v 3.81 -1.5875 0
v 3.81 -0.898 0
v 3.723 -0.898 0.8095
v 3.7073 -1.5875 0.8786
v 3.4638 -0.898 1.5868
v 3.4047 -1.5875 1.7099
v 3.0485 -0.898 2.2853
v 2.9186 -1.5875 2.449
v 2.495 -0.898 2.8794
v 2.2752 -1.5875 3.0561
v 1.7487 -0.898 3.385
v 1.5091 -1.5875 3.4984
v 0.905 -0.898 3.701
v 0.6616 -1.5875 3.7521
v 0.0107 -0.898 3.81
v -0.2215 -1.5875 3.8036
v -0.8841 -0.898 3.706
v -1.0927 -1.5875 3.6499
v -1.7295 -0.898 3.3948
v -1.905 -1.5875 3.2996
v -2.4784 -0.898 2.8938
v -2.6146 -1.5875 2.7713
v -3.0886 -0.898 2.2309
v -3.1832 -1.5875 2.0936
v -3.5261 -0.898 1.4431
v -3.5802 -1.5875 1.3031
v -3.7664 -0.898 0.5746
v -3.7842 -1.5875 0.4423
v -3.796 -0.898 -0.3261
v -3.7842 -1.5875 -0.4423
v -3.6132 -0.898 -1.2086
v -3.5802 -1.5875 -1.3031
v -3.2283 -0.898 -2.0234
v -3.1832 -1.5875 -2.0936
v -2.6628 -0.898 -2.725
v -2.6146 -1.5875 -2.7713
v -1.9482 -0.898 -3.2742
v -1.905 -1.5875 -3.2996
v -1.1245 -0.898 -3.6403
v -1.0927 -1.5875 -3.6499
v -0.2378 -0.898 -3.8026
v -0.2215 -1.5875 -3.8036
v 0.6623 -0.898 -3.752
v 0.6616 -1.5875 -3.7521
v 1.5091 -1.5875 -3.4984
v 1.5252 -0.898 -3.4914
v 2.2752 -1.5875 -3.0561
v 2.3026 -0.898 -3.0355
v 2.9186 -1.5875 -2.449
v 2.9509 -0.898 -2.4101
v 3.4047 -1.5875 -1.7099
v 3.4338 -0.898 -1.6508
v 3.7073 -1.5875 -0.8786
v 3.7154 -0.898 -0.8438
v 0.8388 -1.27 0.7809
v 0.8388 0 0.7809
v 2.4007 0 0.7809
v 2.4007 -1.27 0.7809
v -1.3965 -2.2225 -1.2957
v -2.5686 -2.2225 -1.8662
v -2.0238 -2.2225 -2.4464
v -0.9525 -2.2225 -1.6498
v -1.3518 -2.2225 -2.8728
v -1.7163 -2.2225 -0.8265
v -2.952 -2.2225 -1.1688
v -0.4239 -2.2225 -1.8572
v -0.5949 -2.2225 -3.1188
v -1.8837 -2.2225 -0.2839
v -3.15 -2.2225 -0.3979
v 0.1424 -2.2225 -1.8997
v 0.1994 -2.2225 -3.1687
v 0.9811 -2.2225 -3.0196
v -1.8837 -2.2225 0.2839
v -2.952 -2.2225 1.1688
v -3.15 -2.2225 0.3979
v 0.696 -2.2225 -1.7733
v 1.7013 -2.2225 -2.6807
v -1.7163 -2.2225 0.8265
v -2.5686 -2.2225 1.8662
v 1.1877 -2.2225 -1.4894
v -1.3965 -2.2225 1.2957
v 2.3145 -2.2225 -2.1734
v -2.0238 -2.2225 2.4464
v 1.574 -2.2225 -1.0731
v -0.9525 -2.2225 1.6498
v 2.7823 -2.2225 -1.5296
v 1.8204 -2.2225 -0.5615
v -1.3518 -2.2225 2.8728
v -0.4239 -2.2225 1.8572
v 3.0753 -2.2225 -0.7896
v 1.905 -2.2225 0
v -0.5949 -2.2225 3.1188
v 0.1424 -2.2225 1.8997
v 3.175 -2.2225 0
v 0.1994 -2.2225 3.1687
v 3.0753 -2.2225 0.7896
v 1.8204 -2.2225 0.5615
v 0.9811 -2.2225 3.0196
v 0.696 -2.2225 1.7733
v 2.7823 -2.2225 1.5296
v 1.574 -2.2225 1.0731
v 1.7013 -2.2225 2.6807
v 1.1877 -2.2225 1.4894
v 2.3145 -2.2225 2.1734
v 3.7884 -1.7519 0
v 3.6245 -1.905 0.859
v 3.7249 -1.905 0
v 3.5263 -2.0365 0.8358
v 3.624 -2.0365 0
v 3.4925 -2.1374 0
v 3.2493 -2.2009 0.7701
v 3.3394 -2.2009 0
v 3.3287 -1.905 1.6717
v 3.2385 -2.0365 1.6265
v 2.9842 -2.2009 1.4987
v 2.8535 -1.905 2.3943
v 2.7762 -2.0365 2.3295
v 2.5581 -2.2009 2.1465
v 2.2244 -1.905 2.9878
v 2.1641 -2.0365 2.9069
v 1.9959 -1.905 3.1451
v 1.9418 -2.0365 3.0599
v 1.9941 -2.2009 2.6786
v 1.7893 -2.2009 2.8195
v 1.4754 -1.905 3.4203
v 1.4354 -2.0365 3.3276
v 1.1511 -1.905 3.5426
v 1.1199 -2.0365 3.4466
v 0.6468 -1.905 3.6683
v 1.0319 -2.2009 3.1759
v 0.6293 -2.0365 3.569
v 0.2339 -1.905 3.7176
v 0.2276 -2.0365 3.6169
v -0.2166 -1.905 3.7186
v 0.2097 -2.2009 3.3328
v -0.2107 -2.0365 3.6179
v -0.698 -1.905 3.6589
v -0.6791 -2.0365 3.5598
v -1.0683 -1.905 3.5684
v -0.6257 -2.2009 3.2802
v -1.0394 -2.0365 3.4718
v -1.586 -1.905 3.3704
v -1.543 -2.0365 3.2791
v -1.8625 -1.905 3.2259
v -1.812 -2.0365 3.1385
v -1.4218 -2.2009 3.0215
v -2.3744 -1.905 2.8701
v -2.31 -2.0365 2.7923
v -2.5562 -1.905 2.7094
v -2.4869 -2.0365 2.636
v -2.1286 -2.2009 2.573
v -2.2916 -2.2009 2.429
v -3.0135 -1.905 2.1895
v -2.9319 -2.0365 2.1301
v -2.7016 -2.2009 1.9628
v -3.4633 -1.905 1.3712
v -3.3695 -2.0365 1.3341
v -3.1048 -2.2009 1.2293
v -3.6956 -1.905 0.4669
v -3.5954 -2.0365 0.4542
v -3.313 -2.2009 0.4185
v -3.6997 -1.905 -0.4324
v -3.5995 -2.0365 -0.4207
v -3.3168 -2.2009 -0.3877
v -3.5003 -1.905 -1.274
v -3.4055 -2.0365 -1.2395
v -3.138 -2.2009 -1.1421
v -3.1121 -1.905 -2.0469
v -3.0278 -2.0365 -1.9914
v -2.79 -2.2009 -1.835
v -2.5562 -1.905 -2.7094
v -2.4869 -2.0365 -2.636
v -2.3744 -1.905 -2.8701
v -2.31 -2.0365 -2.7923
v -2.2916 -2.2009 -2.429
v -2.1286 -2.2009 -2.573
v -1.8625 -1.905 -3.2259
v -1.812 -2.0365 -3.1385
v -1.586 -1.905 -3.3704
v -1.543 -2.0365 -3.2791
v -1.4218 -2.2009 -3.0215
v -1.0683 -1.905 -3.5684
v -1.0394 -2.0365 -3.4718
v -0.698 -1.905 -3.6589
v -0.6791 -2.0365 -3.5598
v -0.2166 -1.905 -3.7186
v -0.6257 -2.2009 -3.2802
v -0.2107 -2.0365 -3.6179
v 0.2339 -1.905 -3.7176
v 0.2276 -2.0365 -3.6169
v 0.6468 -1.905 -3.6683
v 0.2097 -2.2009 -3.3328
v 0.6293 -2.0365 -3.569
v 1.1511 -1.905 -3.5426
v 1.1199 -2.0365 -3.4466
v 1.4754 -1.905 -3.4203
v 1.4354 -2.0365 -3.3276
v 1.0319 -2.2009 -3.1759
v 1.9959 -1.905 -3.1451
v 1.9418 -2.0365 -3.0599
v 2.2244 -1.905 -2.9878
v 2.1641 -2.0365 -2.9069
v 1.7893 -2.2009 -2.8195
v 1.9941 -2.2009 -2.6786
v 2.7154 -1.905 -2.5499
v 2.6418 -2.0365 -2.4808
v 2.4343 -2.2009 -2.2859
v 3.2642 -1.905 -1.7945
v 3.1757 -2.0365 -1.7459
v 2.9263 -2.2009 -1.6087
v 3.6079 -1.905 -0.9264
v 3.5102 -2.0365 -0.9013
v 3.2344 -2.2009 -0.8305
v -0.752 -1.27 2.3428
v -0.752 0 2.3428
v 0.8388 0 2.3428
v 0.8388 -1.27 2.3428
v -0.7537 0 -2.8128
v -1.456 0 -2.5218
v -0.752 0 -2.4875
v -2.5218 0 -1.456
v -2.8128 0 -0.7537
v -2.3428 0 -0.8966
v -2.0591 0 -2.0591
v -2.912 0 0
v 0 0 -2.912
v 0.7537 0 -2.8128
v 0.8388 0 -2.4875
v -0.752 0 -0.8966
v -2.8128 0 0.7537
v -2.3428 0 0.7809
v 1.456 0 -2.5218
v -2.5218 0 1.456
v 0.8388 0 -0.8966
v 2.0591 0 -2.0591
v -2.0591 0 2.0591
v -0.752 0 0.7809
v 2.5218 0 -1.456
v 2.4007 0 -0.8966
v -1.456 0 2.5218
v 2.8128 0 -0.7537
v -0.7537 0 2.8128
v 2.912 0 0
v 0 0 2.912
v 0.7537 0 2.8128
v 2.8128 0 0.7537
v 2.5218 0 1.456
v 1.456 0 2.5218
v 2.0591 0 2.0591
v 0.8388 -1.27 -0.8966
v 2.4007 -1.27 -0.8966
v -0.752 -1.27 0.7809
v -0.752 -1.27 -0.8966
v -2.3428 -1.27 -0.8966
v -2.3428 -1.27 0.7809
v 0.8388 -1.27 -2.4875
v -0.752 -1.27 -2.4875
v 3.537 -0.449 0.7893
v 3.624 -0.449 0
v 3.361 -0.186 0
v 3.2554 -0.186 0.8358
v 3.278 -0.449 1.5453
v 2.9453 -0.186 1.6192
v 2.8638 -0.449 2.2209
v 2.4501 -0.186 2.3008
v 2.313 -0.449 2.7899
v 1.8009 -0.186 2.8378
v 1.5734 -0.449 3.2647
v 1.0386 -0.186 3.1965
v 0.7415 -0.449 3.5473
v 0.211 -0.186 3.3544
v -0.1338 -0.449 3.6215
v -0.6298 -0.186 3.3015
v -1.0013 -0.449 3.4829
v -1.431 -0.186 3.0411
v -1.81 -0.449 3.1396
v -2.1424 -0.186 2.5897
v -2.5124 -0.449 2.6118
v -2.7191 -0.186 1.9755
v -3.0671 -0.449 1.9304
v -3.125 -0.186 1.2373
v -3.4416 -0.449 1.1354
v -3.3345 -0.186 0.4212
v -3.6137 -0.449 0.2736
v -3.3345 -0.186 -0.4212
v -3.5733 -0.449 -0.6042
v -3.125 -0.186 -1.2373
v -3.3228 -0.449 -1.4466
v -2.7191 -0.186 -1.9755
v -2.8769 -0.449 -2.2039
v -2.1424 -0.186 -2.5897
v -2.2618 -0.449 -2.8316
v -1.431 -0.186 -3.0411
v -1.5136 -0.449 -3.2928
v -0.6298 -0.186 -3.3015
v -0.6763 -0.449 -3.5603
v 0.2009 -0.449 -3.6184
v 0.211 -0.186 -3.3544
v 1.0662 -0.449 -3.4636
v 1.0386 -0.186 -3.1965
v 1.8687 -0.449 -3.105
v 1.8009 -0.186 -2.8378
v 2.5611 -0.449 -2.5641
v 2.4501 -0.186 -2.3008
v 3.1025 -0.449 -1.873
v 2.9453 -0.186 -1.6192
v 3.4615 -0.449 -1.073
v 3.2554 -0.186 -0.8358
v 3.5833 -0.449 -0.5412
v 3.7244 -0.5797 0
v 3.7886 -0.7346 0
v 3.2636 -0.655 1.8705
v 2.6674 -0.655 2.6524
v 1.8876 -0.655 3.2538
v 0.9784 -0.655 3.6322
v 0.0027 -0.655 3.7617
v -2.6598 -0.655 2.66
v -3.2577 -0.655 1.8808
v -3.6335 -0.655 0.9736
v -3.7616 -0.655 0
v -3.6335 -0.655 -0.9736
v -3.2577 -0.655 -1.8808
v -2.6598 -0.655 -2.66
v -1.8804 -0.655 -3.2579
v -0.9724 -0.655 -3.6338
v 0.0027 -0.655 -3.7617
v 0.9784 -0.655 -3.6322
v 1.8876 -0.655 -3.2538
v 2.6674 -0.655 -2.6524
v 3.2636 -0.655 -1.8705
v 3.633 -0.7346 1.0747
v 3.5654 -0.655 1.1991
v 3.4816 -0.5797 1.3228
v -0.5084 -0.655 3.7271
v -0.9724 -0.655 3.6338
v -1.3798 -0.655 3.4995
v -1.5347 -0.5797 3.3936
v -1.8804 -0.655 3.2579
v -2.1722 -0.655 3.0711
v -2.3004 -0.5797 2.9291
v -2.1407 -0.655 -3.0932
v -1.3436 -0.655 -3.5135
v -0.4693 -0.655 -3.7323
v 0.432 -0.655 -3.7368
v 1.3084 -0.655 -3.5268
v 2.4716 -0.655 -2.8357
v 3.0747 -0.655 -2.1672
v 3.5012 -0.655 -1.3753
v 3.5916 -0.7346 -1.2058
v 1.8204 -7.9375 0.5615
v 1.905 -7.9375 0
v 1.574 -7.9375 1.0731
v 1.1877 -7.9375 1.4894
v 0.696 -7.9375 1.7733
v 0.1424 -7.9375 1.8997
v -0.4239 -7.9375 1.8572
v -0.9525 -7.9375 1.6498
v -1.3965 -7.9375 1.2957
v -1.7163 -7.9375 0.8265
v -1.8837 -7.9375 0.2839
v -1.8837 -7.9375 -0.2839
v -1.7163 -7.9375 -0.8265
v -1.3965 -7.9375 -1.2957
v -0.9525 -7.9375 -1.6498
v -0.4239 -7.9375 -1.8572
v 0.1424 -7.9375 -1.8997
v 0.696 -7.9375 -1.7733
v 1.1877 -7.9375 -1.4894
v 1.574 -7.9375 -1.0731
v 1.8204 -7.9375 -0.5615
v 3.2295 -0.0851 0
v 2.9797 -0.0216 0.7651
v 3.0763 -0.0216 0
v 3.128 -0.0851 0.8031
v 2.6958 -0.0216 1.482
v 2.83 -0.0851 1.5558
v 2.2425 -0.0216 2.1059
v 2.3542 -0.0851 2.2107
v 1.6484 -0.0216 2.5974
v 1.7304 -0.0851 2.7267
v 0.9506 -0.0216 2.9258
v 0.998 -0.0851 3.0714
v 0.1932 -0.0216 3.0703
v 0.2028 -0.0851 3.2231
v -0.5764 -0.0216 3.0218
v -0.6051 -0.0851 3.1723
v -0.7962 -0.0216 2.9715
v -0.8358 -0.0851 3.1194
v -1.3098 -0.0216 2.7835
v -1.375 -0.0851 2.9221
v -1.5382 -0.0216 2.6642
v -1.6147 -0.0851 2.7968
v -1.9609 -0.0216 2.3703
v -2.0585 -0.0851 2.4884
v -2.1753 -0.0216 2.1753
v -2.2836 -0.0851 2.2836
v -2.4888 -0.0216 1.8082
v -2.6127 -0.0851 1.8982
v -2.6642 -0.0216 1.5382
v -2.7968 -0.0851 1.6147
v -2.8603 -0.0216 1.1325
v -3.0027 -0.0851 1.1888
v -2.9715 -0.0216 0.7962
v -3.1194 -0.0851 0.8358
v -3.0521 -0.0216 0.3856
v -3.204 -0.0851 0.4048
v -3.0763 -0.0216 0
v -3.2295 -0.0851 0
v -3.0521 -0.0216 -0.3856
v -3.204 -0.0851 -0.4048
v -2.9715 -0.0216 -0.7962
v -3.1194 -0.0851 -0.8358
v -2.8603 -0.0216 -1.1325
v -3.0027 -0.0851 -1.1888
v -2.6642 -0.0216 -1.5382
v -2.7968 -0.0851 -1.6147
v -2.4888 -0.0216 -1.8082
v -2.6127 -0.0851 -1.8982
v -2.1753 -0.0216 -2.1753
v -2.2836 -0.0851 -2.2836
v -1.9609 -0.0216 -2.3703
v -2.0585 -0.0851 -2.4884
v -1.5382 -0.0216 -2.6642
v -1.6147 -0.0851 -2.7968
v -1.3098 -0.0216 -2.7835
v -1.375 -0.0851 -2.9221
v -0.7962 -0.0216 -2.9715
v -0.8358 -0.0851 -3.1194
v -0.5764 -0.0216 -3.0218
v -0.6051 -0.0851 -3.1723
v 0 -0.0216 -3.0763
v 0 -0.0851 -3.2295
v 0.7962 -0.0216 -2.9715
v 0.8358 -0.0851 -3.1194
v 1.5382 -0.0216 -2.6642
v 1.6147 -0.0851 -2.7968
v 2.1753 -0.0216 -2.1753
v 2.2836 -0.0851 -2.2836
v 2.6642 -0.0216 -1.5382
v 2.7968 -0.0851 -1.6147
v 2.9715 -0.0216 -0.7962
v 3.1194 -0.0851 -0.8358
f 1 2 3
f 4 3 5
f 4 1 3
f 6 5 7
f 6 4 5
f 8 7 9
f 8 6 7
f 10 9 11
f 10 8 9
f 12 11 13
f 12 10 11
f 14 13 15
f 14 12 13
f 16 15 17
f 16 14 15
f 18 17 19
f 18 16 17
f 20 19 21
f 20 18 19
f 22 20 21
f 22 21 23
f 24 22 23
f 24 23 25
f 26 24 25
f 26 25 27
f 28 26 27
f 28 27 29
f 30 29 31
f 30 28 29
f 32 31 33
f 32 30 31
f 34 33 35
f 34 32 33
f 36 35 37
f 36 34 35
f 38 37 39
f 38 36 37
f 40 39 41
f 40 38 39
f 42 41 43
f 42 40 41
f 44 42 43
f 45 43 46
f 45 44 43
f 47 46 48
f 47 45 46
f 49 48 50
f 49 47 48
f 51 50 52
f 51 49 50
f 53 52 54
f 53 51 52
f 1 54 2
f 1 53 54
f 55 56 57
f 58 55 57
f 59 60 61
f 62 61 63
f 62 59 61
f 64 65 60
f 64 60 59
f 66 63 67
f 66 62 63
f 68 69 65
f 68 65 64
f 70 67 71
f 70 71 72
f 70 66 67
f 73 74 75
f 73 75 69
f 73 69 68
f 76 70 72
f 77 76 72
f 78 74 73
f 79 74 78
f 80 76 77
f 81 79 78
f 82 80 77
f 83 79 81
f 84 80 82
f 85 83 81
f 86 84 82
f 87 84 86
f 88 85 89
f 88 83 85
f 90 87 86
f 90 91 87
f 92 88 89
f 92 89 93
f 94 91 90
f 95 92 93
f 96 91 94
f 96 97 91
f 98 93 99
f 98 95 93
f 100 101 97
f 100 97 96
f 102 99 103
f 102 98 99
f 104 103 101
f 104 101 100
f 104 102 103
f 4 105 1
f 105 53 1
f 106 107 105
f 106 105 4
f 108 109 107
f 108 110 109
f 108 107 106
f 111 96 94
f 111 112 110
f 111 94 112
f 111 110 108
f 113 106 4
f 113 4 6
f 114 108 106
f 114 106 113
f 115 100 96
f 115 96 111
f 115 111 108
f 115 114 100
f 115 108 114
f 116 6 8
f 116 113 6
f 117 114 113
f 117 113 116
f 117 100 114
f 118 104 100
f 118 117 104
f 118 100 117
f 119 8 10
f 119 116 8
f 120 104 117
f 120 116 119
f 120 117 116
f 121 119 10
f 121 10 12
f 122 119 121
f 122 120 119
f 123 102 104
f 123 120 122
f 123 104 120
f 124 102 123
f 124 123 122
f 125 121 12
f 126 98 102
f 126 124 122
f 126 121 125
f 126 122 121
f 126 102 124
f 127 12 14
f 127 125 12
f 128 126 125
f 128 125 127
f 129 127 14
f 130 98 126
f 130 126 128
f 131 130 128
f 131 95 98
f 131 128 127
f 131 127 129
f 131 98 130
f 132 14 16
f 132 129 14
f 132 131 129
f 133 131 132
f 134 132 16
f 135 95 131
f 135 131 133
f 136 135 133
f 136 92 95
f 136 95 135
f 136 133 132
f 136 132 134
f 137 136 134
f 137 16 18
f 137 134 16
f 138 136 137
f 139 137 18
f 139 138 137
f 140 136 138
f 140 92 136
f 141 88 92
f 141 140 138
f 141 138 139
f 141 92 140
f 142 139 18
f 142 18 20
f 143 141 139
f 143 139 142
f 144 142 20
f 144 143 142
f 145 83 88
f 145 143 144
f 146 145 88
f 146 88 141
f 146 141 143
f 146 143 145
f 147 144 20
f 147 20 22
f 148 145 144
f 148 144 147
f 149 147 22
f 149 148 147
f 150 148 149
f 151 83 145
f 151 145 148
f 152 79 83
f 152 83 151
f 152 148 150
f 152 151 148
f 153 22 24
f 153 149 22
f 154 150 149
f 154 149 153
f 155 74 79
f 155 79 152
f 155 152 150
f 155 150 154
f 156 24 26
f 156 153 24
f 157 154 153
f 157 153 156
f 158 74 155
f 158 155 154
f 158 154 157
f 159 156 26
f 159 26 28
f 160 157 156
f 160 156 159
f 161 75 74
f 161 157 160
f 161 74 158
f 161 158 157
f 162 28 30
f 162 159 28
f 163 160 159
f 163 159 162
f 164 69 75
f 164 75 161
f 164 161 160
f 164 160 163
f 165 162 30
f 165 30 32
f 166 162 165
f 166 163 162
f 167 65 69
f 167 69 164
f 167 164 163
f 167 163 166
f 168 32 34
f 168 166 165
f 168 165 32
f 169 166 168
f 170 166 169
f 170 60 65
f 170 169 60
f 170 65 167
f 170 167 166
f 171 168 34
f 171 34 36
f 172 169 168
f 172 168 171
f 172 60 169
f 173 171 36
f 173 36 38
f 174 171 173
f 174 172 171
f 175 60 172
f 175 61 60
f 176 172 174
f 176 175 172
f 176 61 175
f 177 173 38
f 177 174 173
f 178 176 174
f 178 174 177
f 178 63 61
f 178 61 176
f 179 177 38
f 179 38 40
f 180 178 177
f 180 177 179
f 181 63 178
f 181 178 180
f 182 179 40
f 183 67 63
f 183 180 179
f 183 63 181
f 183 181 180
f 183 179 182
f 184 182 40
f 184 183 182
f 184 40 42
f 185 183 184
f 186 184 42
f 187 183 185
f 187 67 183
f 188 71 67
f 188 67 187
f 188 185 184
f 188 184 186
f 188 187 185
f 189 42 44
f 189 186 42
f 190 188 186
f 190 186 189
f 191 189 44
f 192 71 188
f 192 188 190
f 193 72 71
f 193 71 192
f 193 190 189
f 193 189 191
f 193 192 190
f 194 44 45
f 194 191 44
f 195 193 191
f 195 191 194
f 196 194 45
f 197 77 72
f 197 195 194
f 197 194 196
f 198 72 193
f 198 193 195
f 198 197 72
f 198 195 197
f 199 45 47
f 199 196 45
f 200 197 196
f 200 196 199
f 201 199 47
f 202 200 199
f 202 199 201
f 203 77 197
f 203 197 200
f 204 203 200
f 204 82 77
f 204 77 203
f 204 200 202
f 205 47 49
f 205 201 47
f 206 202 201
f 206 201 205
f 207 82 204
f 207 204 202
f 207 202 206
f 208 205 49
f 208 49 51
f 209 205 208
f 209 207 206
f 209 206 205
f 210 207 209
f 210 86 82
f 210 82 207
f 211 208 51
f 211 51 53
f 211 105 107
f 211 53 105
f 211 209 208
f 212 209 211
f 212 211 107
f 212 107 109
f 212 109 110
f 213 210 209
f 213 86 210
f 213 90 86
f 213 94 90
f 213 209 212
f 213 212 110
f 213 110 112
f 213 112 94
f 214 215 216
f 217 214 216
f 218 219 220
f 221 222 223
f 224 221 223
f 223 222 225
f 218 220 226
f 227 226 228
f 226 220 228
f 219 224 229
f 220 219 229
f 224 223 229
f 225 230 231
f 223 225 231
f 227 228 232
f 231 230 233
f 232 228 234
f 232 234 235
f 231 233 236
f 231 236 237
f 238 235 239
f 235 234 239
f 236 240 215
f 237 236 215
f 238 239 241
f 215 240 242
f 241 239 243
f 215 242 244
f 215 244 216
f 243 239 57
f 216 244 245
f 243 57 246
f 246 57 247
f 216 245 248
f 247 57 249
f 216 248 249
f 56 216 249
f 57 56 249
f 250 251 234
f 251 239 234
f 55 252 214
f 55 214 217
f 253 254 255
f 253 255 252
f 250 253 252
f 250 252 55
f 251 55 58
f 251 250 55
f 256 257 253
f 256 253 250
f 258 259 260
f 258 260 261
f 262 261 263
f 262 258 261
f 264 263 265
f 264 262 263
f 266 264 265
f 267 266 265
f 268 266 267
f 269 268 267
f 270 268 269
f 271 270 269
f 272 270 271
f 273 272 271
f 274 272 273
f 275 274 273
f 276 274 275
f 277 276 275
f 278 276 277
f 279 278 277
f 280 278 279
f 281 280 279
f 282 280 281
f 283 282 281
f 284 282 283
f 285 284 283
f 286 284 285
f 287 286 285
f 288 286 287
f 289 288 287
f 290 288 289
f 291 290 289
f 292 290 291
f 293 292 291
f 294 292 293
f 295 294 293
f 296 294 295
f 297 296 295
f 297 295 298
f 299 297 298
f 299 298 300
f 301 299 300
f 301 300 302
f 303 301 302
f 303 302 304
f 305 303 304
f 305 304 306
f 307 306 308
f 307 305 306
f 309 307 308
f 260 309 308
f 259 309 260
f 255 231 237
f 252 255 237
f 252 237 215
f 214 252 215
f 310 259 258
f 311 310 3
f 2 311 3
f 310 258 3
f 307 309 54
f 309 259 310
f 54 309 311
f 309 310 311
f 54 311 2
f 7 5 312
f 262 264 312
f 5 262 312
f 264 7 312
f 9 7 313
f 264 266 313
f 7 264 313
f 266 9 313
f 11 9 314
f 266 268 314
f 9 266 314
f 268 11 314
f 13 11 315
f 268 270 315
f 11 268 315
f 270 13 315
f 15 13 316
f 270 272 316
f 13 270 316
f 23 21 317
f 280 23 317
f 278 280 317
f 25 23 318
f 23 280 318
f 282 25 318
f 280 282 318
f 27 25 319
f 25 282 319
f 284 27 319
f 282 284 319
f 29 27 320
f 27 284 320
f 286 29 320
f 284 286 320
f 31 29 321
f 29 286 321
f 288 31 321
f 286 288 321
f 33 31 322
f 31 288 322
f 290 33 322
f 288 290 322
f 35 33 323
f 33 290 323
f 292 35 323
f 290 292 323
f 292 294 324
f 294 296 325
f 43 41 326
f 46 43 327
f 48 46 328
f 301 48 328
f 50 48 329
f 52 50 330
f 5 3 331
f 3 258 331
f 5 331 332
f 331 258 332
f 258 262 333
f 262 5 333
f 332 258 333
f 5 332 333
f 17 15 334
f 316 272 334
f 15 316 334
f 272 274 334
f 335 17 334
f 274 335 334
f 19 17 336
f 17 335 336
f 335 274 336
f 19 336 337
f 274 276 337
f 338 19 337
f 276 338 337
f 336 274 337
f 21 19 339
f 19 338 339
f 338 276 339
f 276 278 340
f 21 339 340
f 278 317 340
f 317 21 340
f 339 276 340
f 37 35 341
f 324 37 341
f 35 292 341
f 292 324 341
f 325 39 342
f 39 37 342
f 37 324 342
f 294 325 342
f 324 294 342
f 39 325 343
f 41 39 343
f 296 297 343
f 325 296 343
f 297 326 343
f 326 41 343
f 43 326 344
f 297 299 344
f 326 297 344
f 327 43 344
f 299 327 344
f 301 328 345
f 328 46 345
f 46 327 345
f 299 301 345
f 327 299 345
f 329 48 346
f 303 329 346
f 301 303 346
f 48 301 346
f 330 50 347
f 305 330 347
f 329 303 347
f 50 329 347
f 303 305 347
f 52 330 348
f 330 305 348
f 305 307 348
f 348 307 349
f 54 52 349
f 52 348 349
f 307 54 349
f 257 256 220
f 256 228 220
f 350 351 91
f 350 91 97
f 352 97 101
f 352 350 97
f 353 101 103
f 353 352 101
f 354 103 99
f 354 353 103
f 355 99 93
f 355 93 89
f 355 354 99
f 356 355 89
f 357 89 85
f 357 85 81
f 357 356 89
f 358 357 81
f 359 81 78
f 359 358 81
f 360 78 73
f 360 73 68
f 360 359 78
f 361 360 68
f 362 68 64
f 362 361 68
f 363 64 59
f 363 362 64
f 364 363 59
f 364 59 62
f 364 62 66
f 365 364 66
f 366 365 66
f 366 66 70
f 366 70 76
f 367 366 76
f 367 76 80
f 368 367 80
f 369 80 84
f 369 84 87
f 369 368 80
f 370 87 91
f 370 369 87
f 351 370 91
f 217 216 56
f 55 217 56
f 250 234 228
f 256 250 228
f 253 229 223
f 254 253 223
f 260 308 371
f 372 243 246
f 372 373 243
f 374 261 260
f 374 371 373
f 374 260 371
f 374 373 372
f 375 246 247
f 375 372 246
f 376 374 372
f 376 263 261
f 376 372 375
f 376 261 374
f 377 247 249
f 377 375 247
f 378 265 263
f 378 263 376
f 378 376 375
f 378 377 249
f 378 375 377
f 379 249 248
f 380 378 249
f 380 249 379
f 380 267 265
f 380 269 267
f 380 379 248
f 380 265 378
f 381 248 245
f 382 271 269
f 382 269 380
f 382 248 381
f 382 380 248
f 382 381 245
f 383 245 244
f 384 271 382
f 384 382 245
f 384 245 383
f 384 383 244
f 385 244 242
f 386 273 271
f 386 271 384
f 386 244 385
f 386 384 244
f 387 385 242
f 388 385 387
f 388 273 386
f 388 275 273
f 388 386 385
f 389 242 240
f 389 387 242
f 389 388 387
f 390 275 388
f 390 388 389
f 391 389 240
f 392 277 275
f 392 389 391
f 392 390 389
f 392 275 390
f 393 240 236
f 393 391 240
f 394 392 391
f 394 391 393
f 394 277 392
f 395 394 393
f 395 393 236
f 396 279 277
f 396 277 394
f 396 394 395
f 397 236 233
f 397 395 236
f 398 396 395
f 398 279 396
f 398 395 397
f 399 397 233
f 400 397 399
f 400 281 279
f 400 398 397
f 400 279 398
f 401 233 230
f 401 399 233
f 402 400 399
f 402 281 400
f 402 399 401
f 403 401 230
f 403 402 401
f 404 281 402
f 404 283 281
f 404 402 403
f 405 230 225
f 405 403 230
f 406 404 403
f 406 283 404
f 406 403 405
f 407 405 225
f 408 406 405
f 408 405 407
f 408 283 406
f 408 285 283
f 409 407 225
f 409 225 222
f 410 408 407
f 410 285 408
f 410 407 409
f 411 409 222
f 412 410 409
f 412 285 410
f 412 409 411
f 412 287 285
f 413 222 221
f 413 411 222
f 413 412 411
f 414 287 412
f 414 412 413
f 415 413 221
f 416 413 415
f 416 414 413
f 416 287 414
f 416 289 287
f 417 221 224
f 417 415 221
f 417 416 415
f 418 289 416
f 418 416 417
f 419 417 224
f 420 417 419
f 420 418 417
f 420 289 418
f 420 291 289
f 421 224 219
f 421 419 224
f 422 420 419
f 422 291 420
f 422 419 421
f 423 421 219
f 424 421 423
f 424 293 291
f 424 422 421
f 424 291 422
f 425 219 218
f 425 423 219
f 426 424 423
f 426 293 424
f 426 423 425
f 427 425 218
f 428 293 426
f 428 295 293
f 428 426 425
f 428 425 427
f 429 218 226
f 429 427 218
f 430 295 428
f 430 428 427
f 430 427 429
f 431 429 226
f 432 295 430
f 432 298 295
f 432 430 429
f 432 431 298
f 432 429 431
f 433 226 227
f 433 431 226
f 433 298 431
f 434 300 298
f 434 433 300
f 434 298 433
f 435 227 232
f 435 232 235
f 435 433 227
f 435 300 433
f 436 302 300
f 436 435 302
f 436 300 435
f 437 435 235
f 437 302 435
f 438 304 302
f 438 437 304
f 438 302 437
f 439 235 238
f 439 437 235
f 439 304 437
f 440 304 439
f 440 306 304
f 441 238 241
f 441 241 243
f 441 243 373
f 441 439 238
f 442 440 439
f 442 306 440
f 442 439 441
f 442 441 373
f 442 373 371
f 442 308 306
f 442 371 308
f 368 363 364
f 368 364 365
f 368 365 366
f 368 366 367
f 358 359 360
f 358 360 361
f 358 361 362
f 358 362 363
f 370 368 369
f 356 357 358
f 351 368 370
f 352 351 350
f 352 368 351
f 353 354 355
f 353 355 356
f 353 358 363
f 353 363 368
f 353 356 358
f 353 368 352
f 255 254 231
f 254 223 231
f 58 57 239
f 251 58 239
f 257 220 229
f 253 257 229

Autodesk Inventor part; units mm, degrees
ref_plane "YZ Plane" through (0, 0, 0) normal (1, 0, 0) x (0, 1, 0)
ref_plane "XZ Plane" through (0, 0, 0) normal (0, 1, 0) x (-1, 0, 0)
ref_plane "XY Plane" through (0, 0, 0) normal (0, 0, 1) x (1, 0, 0)
sketch "Sketch1" plane through (0, 0, 0) normal (0, 0, 1) x (1, 0, 0)
  line L0 (0, 0) -> (3.81, 0)
  line L1 (3.81, 0) -> (3.81, -2.2225)
  line L2 (3.81, -2.2225) -> (1.905, -2.2225)
  line L3 (1.905, -2.2225) -> (1.905, -7.9375)
  line L4 (1.905, -7.9375) -> (0, -7.9375)
  line L5 (0, -7.9375) -> (0, 0)
  line L6 (0, 0) -> (0, -14.1407)
  dimension "d0" = 3.81
  dimension "d1" = 2.2225
  dimension "d2" = 1.905
  dimension "d3" = 5.715
  dimension "d4" = 90
revolve "Revolution1" add sketch "Sketch1" angle 360 about axis through (0, 0, 0) along (0, -1, 0)
chamfer "Chamfer1" distance 0.635 angle 45 1 edges at (-3.81, 0, 0)
fillet "Fillet1" radius 0.635 3 edges at (-3.175, 0, 0) (-3.81, -0.635, 0) (-3.81, -2.2225, 0)
thread "Thread1" size "8-32 UNC" class "2A" standard "ANSI Unified Screw Threads" full length
sketch "Sketch2" plane through (0, 0, 0) normal (0, 1, 0) x (1, 0, 0)
  line L0 (-0.752, -2.3428) -> (0.8388, -2.3428)
  line L1 (0.8388, 2.4875) -> (-0.752, 2.4875)
  line L2 (2.4007, -0.7809) -> (2.4007, 0.8966)
  line L3 (-2.3428, 0.8966) -> (-2.3428, -0.7809)
  line L4 (-2.3428, -0.7809) -> (-0.752, -0.7809)
  line L5 (0.8388, -0.7809) -> (2.4007, -0.7809)
  line L6 (2.4007, 0.8966) -> (0.8388, 0.8966)
  line L7 (-0.752, 0.8966) -> (-2.3428, 0.8966)
  line L8 (-0.752, 2.4875) -> (-0.752, 0.8966)
  line L9 (-0.752, -0.7809) -> (-0.752, -2.3428)
  line L10 (0.8388, -2.3428) -> (0.8388, -0.7809)
  line L11 (0.8388, 0.8966) -> (0.8388, 2.4875)
  point P0 (0, 0)
extrude "Extrusion1" cut sketch "Sketch2" against normal blind 1.27
properties part number "sqrew base" material "Aluminum 6061"
